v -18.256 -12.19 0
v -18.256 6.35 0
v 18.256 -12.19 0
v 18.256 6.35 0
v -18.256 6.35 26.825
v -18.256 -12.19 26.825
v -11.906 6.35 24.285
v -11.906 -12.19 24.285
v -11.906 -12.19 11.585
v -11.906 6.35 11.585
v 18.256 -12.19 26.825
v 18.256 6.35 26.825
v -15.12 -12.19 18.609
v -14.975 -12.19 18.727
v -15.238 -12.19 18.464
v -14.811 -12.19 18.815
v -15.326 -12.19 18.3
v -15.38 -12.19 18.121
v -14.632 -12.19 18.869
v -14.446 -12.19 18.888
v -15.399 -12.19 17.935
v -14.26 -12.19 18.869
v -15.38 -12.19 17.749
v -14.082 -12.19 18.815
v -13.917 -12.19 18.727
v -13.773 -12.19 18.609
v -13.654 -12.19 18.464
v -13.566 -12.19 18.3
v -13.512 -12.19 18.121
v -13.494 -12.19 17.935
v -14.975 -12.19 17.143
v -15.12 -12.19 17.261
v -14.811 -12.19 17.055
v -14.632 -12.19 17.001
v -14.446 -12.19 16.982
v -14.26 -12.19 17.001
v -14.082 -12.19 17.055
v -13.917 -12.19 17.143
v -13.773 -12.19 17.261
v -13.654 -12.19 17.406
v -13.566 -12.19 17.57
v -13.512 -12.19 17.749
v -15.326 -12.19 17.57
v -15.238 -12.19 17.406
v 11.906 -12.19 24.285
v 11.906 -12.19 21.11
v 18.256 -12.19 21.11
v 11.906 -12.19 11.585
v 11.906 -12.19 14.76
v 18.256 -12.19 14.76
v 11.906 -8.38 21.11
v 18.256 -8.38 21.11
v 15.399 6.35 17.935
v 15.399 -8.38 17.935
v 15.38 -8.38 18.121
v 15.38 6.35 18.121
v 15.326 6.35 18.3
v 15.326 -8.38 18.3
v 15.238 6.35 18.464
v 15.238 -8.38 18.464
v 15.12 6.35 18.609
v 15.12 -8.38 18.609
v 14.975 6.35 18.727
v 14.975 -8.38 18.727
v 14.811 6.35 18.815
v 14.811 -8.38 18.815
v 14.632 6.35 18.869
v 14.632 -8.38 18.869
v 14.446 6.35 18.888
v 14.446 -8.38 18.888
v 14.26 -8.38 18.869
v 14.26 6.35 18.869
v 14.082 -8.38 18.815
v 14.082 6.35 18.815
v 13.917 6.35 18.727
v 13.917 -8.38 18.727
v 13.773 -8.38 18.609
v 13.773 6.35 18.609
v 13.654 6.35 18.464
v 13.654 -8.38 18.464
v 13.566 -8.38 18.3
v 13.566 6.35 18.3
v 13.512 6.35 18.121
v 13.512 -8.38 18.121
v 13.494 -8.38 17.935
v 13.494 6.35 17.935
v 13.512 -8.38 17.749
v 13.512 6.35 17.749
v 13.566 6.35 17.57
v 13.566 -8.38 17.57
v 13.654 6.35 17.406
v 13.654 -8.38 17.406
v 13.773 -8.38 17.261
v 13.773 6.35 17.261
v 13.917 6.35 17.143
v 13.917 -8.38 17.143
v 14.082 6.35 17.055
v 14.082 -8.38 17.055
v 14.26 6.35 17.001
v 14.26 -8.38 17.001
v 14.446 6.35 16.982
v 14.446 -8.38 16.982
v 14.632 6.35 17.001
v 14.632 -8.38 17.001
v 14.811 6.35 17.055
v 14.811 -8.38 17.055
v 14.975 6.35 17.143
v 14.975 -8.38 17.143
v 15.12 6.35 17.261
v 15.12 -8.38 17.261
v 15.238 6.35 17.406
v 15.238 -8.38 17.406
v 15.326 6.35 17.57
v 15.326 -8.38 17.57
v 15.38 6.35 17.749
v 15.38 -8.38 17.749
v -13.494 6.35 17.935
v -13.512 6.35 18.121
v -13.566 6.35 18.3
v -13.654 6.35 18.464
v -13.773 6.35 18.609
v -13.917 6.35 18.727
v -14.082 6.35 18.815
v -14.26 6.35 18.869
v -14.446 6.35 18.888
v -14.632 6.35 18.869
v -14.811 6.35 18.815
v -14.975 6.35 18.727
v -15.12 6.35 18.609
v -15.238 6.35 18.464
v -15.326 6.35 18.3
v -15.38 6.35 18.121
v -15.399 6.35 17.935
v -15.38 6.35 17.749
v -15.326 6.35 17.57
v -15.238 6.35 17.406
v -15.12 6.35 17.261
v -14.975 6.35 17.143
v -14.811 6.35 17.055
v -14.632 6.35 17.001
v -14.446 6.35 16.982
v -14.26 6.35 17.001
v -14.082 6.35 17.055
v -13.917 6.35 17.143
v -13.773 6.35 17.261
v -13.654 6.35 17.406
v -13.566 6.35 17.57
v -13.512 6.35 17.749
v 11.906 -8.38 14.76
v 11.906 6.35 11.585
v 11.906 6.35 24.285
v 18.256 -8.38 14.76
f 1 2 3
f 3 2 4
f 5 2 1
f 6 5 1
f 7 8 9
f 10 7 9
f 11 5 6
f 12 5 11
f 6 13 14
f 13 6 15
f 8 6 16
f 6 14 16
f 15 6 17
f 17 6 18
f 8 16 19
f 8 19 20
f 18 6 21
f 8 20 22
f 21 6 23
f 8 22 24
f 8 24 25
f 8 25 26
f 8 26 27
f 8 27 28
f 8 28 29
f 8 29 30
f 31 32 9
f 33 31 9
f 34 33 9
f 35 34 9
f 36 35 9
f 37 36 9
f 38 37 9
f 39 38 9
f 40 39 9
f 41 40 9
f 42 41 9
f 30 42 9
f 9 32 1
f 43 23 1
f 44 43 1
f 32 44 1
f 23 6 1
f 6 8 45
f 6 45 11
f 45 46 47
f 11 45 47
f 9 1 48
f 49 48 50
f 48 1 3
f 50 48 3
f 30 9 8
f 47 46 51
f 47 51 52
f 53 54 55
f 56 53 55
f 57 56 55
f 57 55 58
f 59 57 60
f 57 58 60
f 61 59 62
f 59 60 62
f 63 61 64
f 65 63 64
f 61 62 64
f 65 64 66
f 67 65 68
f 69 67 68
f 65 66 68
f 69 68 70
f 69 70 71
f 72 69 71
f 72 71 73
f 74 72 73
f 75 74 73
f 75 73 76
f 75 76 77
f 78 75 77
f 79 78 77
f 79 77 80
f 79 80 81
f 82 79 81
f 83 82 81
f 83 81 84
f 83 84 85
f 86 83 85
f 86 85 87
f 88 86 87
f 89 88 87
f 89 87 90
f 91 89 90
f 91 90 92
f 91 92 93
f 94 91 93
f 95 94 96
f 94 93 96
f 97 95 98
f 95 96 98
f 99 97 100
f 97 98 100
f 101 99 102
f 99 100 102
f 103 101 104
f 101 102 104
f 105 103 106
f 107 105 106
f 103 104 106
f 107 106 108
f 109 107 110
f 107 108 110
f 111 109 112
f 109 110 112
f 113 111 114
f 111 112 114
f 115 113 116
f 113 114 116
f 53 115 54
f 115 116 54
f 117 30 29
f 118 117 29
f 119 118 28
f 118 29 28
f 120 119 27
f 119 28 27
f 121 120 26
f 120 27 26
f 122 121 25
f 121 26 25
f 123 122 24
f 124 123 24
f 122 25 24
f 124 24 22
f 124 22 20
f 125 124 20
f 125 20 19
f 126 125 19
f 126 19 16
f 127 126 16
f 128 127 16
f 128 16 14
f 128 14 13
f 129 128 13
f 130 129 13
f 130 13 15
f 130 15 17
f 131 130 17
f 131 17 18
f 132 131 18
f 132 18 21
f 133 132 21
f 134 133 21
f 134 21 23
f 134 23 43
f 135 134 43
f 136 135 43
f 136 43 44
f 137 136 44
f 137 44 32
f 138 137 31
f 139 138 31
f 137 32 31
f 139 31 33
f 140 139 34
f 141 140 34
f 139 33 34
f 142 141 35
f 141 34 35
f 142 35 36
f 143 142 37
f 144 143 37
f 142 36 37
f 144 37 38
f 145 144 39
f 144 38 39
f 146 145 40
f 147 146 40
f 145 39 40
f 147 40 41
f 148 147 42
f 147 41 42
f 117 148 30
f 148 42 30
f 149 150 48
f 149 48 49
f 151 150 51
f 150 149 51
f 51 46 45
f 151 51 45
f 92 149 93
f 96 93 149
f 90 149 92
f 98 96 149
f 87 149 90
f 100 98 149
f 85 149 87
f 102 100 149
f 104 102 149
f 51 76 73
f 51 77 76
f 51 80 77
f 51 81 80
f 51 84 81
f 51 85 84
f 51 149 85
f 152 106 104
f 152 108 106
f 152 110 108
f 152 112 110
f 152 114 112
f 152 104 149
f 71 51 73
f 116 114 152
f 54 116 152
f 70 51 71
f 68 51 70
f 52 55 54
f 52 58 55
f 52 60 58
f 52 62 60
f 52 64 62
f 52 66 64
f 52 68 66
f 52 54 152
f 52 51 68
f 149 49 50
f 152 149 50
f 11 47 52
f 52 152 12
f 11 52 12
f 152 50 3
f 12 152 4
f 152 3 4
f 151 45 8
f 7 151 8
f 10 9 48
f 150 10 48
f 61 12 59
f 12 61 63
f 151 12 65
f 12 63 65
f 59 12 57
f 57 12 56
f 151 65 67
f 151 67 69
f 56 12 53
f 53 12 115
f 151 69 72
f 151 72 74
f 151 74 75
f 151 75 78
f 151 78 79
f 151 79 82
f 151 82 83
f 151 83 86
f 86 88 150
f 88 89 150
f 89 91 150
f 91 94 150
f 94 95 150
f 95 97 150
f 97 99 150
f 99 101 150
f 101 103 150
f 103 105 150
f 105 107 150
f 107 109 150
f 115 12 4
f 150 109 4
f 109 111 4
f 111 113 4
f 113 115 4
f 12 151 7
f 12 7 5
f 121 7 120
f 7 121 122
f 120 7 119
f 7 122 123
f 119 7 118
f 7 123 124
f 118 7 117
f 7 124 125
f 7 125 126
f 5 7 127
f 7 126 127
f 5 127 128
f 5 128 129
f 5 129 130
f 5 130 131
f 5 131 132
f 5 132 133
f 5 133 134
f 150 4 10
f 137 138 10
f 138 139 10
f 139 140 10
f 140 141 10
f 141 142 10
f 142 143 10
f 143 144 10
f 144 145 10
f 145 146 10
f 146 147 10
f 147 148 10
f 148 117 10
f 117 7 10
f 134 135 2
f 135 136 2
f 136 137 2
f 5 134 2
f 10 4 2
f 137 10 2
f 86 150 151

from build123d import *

# Parameters (mm, degrees)
F0_W     = 6.35
F0_H     = 12.7
F0_W_2   = 23.8125
F0_H_2   = 2.54
F0_H_3   = 0.76
F1_DEPTH = 26.825
F2_R     = 0.9525
F3_DEPTH = 18.541
F2_W     = 6.35
F2_H     = 6.35
F4_DEPTH = 3.81


with BuildPart() as f1:
    # F0 (on Top) → F1 (new body)
    with BuildSketch(Plane.XY):
        with Locations((-15.08125, 0)):
            Rectangle(F0_W, F0_H)
        Rectangle(F0_W_2, F0_H)
        with Locations((15.08125, 0)):
            Rectangle(F0_W, F0_H)
        with Locations((-15.08125, -7.62)):
            Rectangle(F0_W, F0_H_2)
        with Locations((-15.08125, -9.27)):
            Rectangle(F0_W, F0_H_3)
        Polygon((18.25625, -9.65), (11.90625, -9.65), (-11.90625, -9.65), (-18.25625, -9.65), (-18.25625, -12.19), (18.25625, -12.19), align=None)
        with Locations((0, -7.62)):
            Rectangle(F0_W_2, F0_H_2)
        with Locations((0, -9.27)):
            Rectangle(F0_W_2, F0_H_3)
        with Locations((15.08125, -7.62)):
            Rectangle(F0_W, F0_H_2)
        with Locations((15.08125, -9.27)):
            Rectangle(F0_W, F0_H_3)
    extrude(amount=F1_DEPTH)

    # F2 (on face) → F3 (cut, through all)
    with BuildSketch(Plane.XZ.offset(12.19)):
        Polygon((11.90625, 21.11), (11.90625, 24.285), (8.09625, 24.285), (-8.09625, 24.285), (-11.90625, 24.285), (-11.90625, 11.585), (11.90625, 11.585), (11.90625, 14.76), align=None)
        with Locations((-14.44625, 17.935)):
            Circle(F2_R)
        with Locations((14.44625, 17.935)):
            Circle(F2_R)
    extrude(amount=-F3_DEPTH, mode=Mode.SUBTRACT)

    # F2 (on face) → F4 (cut)
    with BuildSketch(Plane.XZ.offset(12.19)):
        with Locations((15.08125, 17.935)):
            Rectangle(F2_W, F2_H)
        with Locations((14.44625, 17.935)):
            Circle(F2_R, mode=Mode.SUBTRACT)
    extrude(amount=-F4_DEPTH, mode=Mode.SUBTRACT)


solid = f1.part
